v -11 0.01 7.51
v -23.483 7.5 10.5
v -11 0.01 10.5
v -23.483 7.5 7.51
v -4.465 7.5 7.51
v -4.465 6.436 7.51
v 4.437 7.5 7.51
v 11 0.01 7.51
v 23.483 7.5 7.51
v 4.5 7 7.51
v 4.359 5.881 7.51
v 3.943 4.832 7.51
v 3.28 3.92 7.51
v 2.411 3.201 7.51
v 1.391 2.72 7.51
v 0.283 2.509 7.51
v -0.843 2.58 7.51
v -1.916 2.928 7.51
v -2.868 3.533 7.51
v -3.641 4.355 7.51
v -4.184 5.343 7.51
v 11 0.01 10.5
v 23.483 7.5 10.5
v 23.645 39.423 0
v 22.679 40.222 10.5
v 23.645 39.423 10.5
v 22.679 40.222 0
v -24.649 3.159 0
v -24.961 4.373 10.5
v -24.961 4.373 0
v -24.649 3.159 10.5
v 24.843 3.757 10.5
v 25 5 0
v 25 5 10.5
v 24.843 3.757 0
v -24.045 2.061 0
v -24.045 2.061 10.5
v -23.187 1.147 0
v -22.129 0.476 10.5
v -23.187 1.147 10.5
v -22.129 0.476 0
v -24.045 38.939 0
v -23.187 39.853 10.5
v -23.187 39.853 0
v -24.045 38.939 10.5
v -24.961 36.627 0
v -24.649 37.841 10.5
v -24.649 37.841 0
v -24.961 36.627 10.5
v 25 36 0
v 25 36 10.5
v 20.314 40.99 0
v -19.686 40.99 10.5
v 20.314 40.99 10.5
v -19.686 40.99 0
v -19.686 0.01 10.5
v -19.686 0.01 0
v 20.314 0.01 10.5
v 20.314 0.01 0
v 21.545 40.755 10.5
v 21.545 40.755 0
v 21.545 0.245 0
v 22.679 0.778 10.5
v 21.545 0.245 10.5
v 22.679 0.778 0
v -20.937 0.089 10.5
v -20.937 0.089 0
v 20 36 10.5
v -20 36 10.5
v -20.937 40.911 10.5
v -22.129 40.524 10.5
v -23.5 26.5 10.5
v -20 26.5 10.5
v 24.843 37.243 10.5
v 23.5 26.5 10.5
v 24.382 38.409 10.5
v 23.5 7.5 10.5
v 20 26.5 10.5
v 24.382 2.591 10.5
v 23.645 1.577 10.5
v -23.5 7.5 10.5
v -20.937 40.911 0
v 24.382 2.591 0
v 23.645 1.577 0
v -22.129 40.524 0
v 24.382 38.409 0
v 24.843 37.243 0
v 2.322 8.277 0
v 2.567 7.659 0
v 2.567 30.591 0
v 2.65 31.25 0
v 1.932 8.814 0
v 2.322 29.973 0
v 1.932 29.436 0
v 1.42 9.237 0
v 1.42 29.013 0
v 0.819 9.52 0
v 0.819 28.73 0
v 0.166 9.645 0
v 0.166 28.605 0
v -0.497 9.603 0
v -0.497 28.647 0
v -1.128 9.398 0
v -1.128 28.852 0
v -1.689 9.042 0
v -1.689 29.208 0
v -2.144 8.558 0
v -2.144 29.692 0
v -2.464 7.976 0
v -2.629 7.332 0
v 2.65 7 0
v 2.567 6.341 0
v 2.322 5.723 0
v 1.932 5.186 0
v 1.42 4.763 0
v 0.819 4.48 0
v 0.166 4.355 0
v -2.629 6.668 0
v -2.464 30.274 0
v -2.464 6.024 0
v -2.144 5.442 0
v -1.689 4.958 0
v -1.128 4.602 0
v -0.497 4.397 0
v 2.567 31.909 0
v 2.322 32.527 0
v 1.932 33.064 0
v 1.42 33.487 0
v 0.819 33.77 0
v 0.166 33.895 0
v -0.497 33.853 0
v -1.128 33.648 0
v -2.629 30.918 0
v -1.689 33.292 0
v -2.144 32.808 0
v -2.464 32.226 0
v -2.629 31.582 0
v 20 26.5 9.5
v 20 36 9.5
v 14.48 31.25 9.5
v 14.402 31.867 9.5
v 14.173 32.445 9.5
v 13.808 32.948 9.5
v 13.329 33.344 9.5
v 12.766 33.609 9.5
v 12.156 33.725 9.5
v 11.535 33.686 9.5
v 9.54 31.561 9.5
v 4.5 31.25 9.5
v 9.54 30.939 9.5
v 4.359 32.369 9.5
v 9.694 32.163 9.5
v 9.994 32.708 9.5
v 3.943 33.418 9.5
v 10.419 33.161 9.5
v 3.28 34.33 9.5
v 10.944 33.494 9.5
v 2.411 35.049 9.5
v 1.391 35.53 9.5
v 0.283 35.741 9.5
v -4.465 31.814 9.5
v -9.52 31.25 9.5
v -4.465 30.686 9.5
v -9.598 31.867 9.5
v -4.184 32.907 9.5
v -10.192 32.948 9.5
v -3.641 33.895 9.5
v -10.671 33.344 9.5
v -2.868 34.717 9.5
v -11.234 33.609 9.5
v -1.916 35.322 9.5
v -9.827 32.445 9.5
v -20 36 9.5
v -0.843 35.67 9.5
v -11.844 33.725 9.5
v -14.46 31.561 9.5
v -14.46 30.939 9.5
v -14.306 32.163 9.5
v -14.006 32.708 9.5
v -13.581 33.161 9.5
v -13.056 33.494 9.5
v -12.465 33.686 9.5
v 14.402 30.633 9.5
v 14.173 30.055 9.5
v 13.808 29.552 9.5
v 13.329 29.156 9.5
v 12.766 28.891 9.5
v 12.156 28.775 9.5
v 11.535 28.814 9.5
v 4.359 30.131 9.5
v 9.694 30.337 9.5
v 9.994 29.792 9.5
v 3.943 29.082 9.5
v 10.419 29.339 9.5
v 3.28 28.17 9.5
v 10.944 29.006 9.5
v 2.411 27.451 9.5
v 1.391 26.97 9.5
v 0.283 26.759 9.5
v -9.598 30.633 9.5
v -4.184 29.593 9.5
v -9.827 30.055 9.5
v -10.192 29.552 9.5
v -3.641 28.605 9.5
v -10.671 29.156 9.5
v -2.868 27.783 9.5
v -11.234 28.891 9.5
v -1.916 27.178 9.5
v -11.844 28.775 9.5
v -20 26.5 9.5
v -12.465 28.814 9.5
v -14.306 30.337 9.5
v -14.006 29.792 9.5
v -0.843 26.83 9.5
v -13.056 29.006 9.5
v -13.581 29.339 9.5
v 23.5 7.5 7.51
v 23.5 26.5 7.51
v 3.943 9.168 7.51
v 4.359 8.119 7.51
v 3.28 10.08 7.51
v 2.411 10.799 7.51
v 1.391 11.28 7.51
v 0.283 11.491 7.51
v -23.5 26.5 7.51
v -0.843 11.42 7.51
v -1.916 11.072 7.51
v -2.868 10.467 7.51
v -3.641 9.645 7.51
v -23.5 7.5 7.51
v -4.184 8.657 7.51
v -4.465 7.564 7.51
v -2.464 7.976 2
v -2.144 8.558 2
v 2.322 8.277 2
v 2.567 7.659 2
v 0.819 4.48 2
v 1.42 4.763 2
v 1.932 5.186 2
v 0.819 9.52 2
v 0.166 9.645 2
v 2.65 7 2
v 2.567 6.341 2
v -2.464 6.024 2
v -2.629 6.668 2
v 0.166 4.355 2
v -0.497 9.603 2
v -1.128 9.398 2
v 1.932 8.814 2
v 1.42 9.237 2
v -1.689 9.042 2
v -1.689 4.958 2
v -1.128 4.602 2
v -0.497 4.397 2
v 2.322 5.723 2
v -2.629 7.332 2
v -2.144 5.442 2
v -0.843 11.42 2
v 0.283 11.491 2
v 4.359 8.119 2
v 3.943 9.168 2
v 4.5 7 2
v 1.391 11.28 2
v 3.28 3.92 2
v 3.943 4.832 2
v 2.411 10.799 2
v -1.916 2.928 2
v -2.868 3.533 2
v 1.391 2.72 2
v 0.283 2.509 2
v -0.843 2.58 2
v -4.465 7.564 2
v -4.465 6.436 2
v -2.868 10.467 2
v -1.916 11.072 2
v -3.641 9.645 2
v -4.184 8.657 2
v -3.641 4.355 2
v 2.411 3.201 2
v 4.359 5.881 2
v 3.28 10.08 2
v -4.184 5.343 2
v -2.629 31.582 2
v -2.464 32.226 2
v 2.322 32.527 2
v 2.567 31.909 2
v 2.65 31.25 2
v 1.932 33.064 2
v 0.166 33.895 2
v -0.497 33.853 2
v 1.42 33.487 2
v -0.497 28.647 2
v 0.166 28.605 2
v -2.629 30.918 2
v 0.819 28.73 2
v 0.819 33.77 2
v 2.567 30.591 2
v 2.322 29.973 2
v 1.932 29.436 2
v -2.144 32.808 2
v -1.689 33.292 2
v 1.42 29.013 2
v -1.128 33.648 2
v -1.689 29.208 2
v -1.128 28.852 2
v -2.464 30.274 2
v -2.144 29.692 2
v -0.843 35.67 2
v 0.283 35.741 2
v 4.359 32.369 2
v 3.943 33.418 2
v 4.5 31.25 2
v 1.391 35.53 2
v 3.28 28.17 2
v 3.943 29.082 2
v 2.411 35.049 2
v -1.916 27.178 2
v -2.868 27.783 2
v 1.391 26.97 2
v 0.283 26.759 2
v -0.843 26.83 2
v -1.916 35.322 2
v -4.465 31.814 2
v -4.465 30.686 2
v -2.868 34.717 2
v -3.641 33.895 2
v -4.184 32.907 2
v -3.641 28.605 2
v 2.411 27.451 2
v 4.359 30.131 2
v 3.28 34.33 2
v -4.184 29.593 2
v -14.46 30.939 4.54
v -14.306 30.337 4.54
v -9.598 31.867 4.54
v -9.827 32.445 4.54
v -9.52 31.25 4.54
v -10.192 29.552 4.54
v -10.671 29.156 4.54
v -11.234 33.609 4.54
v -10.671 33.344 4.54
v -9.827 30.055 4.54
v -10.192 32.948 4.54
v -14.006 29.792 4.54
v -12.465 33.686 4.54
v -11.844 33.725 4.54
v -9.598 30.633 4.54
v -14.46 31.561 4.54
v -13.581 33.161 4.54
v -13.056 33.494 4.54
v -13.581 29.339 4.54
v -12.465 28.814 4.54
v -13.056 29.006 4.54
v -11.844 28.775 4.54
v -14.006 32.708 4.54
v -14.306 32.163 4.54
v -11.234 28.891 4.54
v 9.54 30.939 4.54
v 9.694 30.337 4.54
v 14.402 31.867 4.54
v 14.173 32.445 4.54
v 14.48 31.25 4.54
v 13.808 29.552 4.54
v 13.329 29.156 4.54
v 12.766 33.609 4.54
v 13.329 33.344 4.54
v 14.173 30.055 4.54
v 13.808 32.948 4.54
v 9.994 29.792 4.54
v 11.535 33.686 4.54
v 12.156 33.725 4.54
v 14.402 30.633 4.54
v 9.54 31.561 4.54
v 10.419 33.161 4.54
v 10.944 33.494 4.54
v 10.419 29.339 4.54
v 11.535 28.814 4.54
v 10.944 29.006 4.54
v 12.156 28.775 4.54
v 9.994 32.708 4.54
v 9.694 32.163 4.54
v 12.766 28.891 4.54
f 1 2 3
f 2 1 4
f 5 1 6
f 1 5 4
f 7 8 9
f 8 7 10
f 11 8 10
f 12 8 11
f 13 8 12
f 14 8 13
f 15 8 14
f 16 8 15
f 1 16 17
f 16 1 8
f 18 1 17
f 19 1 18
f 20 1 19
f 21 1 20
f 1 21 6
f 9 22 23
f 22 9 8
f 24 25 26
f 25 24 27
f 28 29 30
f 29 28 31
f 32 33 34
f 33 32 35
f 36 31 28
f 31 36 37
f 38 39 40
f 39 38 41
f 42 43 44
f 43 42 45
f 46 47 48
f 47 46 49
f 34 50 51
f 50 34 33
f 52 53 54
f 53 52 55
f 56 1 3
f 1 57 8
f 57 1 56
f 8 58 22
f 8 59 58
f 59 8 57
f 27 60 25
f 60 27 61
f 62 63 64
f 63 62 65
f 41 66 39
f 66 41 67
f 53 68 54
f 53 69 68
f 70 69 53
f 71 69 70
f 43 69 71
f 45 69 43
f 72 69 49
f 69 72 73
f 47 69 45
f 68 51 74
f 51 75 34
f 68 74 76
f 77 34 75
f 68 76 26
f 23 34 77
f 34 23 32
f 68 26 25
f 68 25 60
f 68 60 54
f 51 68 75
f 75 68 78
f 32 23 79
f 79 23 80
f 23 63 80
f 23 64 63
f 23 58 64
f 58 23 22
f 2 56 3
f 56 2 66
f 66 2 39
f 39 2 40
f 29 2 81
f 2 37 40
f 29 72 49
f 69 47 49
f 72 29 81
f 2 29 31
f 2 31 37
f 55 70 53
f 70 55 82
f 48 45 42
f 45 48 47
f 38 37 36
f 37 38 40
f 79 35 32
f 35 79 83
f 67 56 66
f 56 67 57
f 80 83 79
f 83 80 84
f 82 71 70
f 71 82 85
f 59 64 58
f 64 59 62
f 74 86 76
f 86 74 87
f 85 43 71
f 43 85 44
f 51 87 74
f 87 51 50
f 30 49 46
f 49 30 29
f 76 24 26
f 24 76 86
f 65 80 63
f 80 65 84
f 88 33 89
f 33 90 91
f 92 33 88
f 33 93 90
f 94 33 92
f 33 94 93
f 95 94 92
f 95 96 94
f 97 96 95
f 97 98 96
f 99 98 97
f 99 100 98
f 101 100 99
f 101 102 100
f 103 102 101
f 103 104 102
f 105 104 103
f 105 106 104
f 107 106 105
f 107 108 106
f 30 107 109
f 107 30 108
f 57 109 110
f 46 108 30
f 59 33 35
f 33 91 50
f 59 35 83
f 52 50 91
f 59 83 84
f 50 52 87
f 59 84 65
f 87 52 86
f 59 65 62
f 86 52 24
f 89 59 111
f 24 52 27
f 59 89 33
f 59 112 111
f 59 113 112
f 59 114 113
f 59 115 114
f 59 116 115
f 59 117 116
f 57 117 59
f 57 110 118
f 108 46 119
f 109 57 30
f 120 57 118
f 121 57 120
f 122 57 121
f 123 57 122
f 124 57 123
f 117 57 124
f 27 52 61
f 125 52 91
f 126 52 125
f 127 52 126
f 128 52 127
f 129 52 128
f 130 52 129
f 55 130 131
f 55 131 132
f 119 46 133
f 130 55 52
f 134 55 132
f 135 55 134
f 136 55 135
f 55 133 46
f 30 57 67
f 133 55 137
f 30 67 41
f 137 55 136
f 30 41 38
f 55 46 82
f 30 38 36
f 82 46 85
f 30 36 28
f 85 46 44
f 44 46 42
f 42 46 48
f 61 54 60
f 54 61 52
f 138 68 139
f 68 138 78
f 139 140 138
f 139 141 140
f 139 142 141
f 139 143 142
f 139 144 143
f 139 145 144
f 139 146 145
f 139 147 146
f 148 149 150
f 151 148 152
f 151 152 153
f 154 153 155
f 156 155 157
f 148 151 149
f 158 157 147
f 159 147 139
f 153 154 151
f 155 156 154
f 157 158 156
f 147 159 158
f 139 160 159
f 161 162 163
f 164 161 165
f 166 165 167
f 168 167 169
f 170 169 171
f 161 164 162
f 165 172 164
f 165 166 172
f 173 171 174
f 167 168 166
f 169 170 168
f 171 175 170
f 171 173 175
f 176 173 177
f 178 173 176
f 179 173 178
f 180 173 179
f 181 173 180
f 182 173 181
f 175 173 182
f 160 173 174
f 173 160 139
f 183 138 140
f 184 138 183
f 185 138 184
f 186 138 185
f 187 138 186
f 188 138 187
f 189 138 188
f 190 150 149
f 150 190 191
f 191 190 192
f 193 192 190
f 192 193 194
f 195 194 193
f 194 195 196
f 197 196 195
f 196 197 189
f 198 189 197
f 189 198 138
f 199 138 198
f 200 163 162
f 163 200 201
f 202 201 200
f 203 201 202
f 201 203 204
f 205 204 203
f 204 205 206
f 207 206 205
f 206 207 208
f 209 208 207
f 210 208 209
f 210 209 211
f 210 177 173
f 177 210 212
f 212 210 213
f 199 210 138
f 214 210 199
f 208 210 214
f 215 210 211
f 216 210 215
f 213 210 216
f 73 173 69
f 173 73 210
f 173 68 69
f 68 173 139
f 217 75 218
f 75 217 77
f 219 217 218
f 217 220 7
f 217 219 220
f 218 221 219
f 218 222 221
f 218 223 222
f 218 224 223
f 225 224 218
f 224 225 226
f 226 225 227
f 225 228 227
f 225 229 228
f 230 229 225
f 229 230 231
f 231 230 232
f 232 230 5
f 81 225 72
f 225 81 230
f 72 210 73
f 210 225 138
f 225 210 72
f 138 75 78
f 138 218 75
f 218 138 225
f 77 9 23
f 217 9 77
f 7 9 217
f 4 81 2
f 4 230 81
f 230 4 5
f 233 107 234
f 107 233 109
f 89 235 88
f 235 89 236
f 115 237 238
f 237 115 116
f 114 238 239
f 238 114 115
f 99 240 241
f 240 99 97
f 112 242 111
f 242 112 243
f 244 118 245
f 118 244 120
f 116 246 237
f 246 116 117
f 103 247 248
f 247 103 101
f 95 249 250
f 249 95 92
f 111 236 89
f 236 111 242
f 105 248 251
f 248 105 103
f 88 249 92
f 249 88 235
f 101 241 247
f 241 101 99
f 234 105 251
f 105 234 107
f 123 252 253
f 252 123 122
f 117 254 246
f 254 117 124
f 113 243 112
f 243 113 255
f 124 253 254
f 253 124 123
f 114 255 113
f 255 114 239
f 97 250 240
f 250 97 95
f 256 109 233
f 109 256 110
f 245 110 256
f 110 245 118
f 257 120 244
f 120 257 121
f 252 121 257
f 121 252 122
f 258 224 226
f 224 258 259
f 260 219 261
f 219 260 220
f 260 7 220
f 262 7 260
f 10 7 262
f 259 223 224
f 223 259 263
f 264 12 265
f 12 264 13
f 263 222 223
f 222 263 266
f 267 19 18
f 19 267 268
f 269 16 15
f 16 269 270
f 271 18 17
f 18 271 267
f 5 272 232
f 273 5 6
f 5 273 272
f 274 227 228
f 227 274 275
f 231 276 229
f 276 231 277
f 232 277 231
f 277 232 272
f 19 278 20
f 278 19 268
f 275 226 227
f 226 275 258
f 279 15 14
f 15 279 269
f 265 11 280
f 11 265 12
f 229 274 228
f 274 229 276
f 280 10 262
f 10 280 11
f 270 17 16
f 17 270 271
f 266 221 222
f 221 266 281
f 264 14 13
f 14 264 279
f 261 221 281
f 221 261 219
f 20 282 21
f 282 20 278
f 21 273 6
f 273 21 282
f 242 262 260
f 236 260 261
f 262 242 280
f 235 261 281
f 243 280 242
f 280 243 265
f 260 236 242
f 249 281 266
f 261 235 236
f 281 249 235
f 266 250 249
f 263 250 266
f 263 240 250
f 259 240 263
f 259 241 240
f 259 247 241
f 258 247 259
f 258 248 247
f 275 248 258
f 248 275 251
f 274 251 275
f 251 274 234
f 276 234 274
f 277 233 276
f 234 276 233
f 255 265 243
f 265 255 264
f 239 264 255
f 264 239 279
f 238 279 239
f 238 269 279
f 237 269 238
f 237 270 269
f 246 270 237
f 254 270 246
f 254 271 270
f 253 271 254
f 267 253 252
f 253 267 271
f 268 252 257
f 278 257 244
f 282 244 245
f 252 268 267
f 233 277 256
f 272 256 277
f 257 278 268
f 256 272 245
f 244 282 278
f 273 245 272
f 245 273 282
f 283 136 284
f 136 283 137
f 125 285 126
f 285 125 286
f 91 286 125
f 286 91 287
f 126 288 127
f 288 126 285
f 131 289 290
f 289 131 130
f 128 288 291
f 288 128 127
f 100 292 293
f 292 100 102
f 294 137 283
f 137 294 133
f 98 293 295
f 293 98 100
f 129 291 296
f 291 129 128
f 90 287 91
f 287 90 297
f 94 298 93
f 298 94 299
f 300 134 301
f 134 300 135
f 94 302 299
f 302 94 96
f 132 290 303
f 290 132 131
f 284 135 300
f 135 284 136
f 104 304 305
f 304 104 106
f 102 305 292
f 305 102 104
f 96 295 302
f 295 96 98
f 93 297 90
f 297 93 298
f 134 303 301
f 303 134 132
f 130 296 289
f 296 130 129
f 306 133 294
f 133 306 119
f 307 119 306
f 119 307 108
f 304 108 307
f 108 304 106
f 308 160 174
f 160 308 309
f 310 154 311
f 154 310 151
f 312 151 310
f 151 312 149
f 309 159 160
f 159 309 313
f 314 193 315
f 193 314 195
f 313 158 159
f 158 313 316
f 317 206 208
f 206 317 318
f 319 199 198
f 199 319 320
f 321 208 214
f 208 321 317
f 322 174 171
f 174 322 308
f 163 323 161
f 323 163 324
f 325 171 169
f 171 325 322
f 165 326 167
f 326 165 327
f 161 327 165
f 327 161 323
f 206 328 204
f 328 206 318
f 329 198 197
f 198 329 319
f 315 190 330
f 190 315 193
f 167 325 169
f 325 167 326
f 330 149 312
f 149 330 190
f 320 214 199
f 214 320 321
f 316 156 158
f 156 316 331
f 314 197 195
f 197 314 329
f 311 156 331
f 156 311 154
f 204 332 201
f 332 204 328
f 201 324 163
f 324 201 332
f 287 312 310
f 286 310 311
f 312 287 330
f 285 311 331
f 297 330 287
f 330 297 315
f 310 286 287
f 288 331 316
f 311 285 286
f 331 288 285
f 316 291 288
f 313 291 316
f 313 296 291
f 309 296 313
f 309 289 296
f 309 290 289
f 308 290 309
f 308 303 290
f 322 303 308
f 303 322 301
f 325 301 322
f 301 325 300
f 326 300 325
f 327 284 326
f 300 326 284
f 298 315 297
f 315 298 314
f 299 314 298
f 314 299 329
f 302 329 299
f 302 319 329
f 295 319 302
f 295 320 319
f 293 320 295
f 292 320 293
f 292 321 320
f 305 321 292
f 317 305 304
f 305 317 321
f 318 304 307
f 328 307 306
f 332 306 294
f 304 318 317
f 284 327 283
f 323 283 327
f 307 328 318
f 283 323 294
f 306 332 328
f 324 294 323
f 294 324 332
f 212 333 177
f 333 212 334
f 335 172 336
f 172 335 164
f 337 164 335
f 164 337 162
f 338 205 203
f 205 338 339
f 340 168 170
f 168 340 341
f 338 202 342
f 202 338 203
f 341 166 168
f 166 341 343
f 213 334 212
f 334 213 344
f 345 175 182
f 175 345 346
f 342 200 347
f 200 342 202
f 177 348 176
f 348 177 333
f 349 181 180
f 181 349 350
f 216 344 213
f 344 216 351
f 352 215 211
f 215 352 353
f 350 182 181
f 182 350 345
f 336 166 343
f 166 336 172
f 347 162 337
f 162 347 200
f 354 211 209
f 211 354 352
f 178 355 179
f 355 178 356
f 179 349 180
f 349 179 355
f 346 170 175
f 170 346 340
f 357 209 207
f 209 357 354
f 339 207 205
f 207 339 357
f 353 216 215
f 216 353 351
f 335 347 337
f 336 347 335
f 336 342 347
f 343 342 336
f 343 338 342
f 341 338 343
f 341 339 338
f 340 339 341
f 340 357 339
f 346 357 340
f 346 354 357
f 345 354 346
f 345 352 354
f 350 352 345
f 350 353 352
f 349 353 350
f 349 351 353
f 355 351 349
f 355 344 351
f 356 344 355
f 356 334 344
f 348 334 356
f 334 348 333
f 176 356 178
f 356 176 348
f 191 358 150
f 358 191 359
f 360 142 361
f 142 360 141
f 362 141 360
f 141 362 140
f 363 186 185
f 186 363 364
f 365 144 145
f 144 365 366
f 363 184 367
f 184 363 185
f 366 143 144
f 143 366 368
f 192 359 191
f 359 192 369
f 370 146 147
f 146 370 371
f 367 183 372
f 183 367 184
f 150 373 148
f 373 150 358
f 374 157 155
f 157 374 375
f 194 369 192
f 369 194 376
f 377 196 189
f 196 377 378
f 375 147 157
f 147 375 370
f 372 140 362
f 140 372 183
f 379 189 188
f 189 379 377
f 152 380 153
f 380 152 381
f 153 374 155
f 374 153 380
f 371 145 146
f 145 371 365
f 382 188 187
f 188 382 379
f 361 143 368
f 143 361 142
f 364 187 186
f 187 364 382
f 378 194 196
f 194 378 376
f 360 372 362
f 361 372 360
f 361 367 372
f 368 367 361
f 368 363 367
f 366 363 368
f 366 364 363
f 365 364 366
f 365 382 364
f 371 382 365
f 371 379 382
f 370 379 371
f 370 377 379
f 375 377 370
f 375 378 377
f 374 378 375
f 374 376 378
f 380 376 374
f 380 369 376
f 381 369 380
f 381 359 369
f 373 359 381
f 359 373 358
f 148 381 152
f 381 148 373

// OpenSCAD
// Scraper Magnetic Holder

// Magnet Diameter
magnet_diam = 4.76;

// Magenet Length
magnet_len = 4.76;

holder(magnet_diam, magnet_len);

module holder(magnet_diam, magnet_len)
{
	$fn = 25;
	extra = .2;
	screw_lip = 2;

	// Add 1mm to the bottom, and 1mm slot for razor blade
	height = screw_lip + 7.5 + 1;
	width = 50;
	length = 41;

	handle_depth = 3;
	triange_width = sqrt(2) * 47 / 2;
	screw_shaft_r = (5 + extra + .1) / 2;
	screw_head_r = 9 / 2;
	screw1_y = 7;
	screw2_y = length - 9.75;

	difference()
	{
		// Base block
		translate([-width/2,0,0])
			minkowski() {
				cube([width - 10, length - 10, height - .01]);
				translate([5, 5, 0]) cylinder(r = 5, h = .01);
			}
		// Slot for razor blade
		translate([-20, length-15, height - 1]) cube([40, 10, 1.1]);
		// Slot for handle
		translate([-47/2, length - 19 - 14.5, height-handle_depth+.01]) cube([47, 19, handle_depth]);
		// Angled retainer for handle
		translate([0, length - 33.5 + .01, height - handle_depth/2+.01]) scale([1,.6,1])
			difference()
			{
				rotate([0, 0, 45]) cube([triange_width, triange_width, handle_depth], center=true);
				translate([-width/2,0,-height/2]) cube([width, width, height]);
			}
		//translate([0,0,height - handle_depth/2+.01]) cube([26, 10, handle_depth], center=true);

		// Mounting Screws
		translate([0, screw1_y, -.01]) cylinder(h = 2.1, r = screw_shaft_r);
		translate([0, screw1_y, screw_lip]) cylinder(h = height, r = screw_head_r);

		translate([0, screw2_y, -.01]) cylinder(h = 2.1, r = screw_shaft_r);
		translate([0, screw2_y, screw_lip]) cylinder(h = height, r = screw_head_r);

		// Magnet holes
		translate([-12, screw2_y, height - magnet_len - 1 - extra]) cylinder(h = magnet_len + 1, r = magnet_diam / 2 + extra/2);
		translate([12, screw2_y, height - magnet_len - 1 - extra]) cylinder(h = magnet_len + 1, r = magnet_diam / 2 + extra/2);
	}
}
